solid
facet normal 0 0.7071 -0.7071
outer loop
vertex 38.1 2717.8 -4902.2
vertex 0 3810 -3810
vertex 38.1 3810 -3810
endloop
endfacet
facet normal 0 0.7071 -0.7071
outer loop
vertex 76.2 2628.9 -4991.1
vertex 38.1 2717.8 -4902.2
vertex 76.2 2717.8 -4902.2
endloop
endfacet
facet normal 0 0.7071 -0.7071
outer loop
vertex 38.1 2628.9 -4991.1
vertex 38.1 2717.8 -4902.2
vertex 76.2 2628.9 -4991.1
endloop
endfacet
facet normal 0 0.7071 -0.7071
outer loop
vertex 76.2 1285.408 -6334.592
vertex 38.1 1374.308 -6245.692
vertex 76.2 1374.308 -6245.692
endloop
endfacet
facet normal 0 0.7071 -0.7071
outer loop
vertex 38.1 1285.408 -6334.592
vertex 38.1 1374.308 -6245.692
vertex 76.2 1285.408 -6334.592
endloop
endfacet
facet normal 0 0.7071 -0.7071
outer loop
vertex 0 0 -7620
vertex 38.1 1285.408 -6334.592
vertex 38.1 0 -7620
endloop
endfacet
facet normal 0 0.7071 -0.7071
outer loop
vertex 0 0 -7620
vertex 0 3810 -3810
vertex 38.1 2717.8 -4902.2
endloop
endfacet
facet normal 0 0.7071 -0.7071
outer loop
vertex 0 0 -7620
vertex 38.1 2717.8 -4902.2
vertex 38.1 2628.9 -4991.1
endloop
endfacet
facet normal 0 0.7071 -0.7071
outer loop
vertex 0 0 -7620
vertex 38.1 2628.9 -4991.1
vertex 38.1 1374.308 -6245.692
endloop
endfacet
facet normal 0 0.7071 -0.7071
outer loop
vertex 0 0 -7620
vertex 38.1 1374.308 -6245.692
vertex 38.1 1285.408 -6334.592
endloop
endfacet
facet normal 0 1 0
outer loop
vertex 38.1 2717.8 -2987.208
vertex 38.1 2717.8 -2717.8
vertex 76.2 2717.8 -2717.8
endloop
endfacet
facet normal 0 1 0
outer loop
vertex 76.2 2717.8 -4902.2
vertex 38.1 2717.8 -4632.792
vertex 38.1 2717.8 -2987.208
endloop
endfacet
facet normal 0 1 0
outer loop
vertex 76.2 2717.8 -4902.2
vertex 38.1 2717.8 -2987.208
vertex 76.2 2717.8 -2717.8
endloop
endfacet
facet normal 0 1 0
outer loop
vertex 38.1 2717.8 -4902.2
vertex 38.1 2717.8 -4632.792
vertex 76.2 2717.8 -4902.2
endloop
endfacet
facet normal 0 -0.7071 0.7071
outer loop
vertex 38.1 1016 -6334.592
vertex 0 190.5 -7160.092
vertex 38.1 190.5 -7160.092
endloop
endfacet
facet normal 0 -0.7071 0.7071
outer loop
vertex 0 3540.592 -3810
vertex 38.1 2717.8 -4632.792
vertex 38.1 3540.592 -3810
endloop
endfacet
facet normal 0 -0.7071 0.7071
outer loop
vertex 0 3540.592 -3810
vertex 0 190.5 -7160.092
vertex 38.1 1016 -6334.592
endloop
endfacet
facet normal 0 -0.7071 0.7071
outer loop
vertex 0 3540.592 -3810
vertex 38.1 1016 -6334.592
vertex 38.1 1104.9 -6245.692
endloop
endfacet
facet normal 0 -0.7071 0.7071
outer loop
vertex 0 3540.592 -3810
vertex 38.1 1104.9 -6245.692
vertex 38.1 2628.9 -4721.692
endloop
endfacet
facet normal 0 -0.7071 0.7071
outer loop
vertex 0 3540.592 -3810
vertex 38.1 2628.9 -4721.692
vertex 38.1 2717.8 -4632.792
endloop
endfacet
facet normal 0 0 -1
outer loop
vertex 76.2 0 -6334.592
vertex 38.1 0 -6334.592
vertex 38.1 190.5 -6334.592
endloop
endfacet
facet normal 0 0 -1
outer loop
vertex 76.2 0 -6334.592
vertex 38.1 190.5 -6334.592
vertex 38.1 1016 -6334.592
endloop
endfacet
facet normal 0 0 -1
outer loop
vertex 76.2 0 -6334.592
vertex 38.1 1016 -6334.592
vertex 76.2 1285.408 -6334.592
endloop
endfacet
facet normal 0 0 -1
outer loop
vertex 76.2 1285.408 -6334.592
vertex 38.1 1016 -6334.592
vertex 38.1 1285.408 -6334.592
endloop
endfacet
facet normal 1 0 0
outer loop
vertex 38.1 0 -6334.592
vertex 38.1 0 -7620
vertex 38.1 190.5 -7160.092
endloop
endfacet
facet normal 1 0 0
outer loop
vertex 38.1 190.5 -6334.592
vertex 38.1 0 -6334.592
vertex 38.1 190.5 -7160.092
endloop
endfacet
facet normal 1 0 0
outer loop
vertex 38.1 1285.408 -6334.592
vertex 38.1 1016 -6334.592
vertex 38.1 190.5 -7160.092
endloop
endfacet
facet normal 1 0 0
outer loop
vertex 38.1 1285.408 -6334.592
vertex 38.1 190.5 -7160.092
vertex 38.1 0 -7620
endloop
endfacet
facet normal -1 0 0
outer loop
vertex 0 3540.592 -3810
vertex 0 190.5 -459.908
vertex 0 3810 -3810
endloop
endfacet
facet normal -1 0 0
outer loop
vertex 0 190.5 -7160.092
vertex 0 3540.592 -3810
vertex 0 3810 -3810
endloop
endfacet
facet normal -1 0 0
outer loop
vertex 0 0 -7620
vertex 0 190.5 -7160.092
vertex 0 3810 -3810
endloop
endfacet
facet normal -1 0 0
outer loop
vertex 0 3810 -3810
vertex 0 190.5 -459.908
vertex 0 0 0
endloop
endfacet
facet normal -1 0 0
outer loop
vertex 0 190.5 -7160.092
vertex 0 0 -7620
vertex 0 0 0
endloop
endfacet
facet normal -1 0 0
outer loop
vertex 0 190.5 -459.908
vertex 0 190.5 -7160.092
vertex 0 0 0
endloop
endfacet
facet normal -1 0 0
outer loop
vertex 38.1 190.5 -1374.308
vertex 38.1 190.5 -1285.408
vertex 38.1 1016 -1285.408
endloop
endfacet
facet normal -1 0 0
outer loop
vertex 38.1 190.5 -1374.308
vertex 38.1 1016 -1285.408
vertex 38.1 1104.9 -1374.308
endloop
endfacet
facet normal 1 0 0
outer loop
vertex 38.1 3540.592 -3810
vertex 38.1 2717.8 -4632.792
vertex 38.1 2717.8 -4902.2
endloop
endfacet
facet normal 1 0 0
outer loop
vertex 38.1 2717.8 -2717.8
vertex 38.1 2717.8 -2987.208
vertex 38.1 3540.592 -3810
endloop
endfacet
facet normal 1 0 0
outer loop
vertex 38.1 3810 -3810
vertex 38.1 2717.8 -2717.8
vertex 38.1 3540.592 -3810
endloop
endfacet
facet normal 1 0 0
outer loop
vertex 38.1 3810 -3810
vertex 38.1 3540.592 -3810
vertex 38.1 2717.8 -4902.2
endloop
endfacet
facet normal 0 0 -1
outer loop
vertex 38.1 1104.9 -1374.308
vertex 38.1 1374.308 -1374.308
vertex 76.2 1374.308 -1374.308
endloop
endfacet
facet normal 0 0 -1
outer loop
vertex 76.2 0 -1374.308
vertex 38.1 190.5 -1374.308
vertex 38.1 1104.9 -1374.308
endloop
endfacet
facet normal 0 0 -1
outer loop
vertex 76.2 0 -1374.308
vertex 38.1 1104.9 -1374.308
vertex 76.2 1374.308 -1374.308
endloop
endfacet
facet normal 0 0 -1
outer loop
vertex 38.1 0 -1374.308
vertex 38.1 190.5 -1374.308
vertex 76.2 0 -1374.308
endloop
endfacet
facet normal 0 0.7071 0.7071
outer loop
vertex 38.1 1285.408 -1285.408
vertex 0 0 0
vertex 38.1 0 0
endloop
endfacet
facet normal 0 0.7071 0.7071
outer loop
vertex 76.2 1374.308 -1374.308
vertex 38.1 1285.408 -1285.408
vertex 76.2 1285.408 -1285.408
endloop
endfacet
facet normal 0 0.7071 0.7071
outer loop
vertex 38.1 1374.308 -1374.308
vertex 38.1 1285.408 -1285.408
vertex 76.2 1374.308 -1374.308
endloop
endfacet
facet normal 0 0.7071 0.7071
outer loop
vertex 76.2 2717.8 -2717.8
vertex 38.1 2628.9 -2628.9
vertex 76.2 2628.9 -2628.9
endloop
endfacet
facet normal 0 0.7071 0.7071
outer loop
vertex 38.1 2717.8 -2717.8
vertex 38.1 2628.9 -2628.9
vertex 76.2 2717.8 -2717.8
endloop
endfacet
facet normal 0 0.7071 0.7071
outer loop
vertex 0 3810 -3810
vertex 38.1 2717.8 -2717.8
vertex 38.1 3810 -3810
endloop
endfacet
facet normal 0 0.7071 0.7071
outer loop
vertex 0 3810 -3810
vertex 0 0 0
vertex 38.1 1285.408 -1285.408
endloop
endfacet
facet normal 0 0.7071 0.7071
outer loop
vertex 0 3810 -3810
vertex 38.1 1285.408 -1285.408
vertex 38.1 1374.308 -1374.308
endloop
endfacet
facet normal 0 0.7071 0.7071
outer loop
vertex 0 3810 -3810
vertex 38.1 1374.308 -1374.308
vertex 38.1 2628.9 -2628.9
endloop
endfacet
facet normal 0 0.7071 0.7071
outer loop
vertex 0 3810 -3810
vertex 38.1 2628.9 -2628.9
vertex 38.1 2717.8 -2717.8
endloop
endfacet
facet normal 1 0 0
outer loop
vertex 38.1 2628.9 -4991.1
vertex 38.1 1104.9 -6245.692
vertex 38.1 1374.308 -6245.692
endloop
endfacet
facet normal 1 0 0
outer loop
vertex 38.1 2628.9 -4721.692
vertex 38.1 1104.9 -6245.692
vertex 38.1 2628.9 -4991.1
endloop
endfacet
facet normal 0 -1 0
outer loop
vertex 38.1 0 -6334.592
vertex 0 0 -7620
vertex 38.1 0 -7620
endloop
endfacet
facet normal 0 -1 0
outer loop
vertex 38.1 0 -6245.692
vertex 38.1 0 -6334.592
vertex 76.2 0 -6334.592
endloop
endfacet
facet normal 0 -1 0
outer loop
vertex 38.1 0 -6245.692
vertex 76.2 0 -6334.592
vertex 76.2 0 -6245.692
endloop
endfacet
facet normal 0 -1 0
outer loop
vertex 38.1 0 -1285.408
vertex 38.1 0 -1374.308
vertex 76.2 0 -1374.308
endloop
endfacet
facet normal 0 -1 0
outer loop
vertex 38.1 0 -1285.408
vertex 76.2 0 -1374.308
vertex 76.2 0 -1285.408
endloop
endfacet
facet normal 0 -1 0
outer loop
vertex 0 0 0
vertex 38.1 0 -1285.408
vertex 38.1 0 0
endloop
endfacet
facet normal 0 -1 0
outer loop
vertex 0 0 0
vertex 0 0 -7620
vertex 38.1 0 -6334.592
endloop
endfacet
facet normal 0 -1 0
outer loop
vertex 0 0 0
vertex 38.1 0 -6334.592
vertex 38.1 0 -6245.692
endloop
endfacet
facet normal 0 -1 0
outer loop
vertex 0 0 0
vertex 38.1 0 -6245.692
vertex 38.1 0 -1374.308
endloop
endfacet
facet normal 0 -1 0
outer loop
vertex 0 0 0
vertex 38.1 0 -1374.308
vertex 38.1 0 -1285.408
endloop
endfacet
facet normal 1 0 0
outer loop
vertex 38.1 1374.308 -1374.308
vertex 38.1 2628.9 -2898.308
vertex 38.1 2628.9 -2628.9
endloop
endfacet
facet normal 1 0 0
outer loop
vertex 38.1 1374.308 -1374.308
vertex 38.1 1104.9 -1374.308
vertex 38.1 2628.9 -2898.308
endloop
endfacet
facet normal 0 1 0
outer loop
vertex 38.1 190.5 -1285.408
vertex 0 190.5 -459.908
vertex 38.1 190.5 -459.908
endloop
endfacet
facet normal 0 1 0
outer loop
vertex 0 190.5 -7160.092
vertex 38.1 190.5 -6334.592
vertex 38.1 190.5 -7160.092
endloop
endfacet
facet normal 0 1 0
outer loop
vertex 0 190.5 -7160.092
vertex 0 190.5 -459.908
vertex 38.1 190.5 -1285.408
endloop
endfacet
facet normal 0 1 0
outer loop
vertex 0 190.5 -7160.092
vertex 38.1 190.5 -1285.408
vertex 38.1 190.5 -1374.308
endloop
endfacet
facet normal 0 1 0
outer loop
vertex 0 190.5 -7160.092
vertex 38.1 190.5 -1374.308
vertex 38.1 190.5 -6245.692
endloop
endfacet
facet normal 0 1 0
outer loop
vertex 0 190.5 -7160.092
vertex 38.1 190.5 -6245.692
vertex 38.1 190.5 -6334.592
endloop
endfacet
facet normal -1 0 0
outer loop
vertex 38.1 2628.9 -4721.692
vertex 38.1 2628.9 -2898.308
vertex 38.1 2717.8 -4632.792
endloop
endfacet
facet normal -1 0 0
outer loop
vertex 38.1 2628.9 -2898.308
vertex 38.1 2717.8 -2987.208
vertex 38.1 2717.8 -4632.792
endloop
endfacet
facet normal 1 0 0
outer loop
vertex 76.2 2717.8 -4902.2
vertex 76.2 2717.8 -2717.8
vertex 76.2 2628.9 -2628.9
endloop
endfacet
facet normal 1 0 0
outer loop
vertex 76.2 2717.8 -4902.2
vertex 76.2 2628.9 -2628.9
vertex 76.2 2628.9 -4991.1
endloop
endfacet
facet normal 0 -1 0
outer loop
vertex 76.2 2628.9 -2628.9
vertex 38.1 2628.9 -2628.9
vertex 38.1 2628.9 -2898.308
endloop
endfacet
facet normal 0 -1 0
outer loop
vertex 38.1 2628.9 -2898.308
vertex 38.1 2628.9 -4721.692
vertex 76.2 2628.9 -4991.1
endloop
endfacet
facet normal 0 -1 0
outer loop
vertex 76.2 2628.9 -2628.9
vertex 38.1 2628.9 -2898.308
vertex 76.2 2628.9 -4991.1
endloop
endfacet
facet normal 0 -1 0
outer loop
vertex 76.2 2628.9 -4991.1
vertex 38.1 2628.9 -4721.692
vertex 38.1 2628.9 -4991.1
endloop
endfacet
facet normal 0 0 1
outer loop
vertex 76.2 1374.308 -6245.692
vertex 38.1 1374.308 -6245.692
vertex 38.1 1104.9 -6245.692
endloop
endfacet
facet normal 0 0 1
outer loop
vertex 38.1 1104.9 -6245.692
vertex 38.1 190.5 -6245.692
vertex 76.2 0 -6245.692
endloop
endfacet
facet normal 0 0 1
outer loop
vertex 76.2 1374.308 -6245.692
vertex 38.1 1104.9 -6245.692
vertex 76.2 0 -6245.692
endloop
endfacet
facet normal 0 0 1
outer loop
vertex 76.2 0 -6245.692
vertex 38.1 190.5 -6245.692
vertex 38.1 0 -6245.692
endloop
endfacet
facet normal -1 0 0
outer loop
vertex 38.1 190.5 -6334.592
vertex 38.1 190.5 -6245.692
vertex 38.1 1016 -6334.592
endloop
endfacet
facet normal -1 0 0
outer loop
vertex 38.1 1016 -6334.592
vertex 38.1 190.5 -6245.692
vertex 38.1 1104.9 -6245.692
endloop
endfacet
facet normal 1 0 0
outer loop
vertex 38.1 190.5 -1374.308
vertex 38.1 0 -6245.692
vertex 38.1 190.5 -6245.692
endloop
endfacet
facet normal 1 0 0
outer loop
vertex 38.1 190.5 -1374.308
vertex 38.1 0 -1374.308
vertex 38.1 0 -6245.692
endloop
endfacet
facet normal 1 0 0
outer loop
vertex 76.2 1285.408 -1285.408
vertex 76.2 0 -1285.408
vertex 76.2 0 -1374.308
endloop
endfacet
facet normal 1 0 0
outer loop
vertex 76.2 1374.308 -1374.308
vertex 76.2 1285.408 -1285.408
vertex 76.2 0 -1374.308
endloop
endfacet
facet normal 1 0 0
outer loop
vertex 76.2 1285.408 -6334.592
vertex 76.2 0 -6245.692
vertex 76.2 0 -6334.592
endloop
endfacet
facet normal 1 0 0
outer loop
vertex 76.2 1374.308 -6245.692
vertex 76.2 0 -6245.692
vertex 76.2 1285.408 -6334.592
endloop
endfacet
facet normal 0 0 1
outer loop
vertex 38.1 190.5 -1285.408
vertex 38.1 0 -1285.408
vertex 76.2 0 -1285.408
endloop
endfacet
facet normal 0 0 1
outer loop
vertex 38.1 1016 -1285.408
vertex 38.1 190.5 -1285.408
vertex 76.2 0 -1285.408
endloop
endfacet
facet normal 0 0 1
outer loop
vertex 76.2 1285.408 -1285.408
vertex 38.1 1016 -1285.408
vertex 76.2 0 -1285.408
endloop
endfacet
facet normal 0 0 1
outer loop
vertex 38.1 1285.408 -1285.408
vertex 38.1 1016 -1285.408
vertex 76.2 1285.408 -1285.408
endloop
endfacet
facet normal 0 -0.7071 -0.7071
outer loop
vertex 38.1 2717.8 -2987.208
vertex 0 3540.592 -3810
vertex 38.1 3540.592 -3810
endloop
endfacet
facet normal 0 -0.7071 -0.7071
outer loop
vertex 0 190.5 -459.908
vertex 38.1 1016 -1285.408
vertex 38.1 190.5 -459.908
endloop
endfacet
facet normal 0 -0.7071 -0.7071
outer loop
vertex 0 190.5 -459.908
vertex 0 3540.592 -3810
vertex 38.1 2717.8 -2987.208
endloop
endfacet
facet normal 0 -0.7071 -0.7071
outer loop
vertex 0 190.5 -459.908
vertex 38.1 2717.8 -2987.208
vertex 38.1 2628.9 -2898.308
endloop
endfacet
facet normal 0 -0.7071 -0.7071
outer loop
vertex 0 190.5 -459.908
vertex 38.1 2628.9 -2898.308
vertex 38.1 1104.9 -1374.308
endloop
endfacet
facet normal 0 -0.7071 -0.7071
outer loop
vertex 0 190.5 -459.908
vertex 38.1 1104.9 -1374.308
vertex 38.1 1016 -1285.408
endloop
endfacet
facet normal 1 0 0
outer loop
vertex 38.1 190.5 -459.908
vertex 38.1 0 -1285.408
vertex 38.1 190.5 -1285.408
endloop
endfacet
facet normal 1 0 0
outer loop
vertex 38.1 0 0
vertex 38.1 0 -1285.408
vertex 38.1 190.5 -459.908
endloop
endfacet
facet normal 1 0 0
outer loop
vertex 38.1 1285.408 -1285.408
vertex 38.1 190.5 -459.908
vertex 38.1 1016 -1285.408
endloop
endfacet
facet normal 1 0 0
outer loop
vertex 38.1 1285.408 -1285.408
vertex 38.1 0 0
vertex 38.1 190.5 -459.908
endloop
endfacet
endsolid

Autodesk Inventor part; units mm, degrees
ref_plane "YZ Plane" through (0, 0, 0) normal (1, 0, 0) x (0, 1, 0)
ref_plane "XZ Plane" through (0, 0, 0) normal (0, 1, 0) x (-1, 0, 0)
ref_plane "XY Plane" through (0, 0, 0) normal (0, 0, 1) x (1, 0, 0)
sketch "Sketch1" plane through (0, 0, 0) normal (1, 0, 0) x (0, 1, 0)
  line L0 (0, 0) -> (3810, -3810)
  line L1 (3810, -3810) -> (0, -7620)
  line L2 (0, -7620) -> (0, 0)
  line L3 (3540.5923, -3810) -> (190.5, -459.9077)
  line L4 (190.5, -459.9077) -> (190.5, -7160.0923)
  line L5 (190.5, -7160.0923) -> (3540.5923, -3810)
  dimension "d2" = 45
  dimension "d5" = 7620
  dimension "d6" = 190.5
extrude "Extrusion1" add sketch "Sketch1" along normal blind 38.1
sketch "Sketch2" plane through (38.1, 0, 0) normal (1, 0, 0) x (0, 0, -1)
  line L0 (3810, 3810) -> (0, 0) projected
  line L1 (2628.9, 2628.9) -> (2717.8, 2717.8)
  line L2 (7620, 0) -> (3810, 3810) projected
  line L3 (4902.2, 2717.8) -> (4991.1, 2628.9)
  line L4 (2628.9, 2628.9) -> (4991.1, 2628.9)
  line L5 (2717.8, 2717.8) -> (4902.2, 2717.8)
  line L6 (459.9077, 190.5) -> (3810, 3540.5923) projected
  line L7 (3810, 3540.5923) -> (7160.0923, 190.5) projected
  line L8 (7160.0923, 190.5) -> (459.9077, 190.5) projected
  line L9 (0, 0) -> (7620, 0) projected
  line L10 (6334.5923, 0) -> (6334.5923, 1285.4077)
  line L11 (6334.5923, 1285.4077) -> (6245.6923, 1374.3077)
  line L12 (6245.6923, 1374.3077) -> (6245.6923, 0)
  line L13 (6245.6923, 0) -> (6334.5923, 0)
  line L14 (1285.4077, 0) -> (1285.4077, 1285.4077)
  line L15 (1285.4077, 1285.4077) -> (1374.3077, 1374.3077)
  line L16 (1374.3077, 1374.3077) -> (1374.3077, 0)
  line L17 (1374.3077, 0) -> (1285.4077, 0)
  point P0 (6245.6923, 1104.9)
  point P1 (6245.6923, 190.5)
  point P2 (1374.3077, 1104.9)
  point P3 (1374.3077, 190.5)
  dimension "d7" = 88.9
  dimension "d9" = 2438.4
  dimension "d10" = 88.9
  dimension "d11" = 914.4
  dimension "d12" = 88.9
  dimension "d14" = 914.4
extrude "Extrusion2" add sketch "Sketch2" along normal blind 38.1 contours L5 L6 L4 L0 | L2 L4 L7 L5 | L5 L7 L4 L6 | L16 L6 L14 L0 | L2 L10 L7 L12 | L16 L8 L14 L6 | L7 L10 L8 L12 | L16 L9 L14 L8 | L8 L10 L9 L12
properties part number "Gable" material "Wood (Southern Pine)"
